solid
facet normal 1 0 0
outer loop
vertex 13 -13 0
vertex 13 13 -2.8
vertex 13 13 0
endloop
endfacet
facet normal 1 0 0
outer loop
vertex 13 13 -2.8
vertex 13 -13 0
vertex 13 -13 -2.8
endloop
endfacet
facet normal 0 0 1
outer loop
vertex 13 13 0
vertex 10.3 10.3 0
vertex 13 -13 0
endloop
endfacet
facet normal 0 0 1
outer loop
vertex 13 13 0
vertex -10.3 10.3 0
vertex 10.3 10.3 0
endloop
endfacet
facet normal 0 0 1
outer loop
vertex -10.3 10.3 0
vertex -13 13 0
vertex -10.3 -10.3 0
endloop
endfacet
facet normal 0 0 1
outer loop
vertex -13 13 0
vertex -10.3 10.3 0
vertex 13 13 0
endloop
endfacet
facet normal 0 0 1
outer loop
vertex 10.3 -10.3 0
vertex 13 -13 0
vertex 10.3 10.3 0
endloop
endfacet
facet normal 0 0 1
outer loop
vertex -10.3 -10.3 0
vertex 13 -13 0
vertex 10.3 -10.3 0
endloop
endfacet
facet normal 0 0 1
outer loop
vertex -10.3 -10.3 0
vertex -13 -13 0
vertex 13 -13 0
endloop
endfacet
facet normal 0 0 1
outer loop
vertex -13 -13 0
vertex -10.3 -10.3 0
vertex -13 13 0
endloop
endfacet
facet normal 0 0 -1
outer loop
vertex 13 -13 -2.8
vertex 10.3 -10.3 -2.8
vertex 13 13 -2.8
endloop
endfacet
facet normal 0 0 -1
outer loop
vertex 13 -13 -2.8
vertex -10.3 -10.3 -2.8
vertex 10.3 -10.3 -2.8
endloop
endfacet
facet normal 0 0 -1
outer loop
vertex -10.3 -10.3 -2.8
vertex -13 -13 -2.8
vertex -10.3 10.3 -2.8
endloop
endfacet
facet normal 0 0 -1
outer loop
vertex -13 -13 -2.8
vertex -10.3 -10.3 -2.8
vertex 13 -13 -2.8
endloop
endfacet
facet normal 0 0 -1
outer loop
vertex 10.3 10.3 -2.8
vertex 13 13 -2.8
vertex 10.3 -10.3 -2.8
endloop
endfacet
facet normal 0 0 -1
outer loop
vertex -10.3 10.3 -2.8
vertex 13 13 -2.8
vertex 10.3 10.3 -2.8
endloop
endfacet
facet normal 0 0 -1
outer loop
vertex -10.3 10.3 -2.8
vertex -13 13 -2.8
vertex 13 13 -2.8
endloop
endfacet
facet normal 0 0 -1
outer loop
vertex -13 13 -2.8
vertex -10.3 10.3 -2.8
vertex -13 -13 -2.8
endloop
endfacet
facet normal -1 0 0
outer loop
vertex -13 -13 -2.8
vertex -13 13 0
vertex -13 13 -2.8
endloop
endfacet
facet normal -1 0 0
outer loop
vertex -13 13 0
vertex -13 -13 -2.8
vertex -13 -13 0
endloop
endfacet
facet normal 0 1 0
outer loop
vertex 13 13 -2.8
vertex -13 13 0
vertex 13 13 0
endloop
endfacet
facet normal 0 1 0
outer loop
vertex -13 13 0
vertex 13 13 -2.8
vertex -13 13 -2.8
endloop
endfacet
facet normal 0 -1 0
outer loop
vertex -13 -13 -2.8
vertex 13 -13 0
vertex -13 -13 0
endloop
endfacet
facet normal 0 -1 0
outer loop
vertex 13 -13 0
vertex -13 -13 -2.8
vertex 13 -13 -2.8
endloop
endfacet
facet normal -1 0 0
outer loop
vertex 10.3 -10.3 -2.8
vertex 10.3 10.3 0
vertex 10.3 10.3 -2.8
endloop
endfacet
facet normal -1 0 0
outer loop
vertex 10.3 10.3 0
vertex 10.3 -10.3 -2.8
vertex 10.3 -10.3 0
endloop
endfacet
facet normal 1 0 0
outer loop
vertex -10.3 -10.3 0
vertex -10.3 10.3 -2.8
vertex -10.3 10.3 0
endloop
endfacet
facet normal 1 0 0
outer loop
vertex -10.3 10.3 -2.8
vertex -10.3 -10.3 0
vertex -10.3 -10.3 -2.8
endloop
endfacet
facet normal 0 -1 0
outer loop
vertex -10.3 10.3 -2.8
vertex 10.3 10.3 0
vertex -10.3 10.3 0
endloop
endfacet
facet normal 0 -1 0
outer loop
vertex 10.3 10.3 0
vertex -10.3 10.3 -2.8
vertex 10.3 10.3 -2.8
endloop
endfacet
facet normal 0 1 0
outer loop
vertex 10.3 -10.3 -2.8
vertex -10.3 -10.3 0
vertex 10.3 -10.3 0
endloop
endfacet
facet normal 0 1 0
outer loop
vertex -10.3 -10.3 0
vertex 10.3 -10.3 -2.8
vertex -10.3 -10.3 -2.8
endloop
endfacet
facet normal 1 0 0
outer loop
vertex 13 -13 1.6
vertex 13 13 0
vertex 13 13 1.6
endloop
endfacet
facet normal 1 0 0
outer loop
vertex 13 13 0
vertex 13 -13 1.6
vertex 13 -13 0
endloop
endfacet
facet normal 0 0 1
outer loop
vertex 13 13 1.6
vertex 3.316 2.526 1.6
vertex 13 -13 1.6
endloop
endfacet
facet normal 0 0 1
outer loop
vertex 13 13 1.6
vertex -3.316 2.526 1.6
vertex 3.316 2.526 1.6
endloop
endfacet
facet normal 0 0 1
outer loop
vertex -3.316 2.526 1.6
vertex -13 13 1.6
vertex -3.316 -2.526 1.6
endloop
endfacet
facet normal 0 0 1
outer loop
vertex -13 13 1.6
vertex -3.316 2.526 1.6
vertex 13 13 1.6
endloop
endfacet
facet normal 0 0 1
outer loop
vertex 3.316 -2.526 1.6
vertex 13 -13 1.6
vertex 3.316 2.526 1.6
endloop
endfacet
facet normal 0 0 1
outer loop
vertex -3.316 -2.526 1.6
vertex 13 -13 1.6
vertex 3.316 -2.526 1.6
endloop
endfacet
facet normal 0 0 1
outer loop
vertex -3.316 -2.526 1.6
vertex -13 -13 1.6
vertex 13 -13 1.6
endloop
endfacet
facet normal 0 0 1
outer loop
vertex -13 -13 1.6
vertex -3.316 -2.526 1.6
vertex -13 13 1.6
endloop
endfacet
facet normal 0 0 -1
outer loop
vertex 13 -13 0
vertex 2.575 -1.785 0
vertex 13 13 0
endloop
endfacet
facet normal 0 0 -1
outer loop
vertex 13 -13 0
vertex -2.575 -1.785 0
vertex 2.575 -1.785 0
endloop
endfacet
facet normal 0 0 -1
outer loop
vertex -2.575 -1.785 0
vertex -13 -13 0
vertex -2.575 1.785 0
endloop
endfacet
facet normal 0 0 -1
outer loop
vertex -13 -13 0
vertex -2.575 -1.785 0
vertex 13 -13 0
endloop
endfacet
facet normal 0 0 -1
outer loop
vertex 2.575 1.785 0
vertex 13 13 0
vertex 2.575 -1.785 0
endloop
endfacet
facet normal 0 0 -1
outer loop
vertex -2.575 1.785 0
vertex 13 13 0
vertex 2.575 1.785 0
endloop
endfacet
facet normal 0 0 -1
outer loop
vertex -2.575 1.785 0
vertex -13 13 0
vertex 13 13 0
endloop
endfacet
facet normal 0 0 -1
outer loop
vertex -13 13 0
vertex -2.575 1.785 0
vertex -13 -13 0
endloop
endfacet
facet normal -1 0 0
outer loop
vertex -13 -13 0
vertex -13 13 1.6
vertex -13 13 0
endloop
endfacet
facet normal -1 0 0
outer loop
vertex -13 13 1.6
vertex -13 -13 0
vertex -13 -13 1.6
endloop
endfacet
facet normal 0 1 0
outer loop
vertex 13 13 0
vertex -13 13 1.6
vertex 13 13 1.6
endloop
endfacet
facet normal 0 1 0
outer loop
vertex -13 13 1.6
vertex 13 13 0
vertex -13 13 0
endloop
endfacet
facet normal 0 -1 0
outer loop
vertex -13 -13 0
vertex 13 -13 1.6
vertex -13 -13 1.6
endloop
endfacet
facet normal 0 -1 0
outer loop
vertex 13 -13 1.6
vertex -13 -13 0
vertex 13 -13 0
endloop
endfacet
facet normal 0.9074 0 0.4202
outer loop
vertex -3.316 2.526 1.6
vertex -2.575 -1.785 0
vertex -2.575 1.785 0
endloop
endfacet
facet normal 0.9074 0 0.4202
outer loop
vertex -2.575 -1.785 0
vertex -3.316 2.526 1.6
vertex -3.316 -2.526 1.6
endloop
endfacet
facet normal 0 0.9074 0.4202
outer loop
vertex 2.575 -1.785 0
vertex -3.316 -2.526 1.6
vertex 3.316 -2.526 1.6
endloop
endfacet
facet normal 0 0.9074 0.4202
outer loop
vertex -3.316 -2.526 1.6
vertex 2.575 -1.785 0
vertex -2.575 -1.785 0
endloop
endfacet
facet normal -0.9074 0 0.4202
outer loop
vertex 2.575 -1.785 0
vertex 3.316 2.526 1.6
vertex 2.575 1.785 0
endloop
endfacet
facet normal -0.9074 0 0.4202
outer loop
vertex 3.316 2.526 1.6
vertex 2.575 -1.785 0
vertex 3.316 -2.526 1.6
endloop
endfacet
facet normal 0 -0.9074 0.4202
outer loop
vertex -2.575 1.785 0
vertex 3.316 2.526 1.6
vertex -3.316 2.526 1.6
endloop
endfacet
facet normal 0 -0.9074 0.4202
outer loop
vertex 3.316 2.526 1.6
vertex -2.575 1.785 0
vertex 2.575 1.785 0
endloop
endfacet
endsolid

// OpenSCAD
// Parametric front window + pocket for a Qwiic APDS-9960 breakout.
//
// UNTESTED DESIGN. Measure your breakout and enclosure wall, then set the
// MEASURE parameters below. Print in an opaque, matte, dark material:
// light-coloured or translucent plastic leaks the sensor's own IR into its
// photodiodes (crosstalk) and ruins gesture detection.
//
// Optical rules this model enforces:
//  * The APDS-9960 package (IR LED + photodiode array, 3.94 x 2.36 mm per
//    the datasheet) sits directly behind an OPEN aperture: no cover, no
//    window, no tape. (An IR-transparent window is possible but needs its
//    own crosstalk testing and is not modelled here.)
//  * The aperture widens outward (chamfer) so the sensor's field of view is
//    not clipped by the wall thickness.
//  * The package face sits as close to the outer surface as the wall allows
//    (`face_gap`); a deep tunnel reflects IR back into the sensor.

// ---- MEASURE (mm) ----
board_w = 20.0;      // breakout PCB width  (MEASURE)
board_h = 20.0;      // breakout PCB height (MEASURE)
board_t = 1.6;       // PCB thickness
sensor_dx = 0.0;     // sensor centre offset from PCB centre, x (MEASURE)
sensor_dy = 0.0;     // sensor centre offset from PCB centre, y (MEASURE)
wall = 1.6;          // enclosure wall thickness at the window
face_gap = 0.2;      // air gap between package top and wall inner face

// ---- Optical aperture ----
pkg_w = 3.94;        // APDS-9960 package (datasheet)
pkg_h = 2.36;
margin = 0.6;        // clearance around the package at the inner face
flare = 50;          // total outward chamfer angle in degrees (field-of-view relief)

// ---- Mount ----
clearance = 0.3;
pocket_depth = board_t + 1.0;
plate_margin = 3.0;

$fn = 48;

module aperture() {
  iw = pkg_w + 2 * margin;
  ih = pkg_h + 2 * margin;
  grow = 2 * wall * tan(flare / 2);
  // Truncated pyramid through the wall, small side inside.
  translate([sensor_dx, sensor_dy, -0.01])
    hull() {
      translate([-iw / 2, -ih / 2, 0]) cube([iw, ih, 0.01]);
      translate([-(iw + grow) / 2, -(ih + grow) / 2, wall + 0.01]) cube([iw + grow, ih + grow, 0.01]);
    }
}

module window_plate() {
  pw = board_w + 2 * plate_margin;
  ph = board_h + 2 * plate_margin;
  difference() {
    union() {
      // Wall section (outer surface at z = wall).
      translate([-pw / 2, -ph / 2, 0]) cube([pw, ph, wall]);
      // Pocket walls behind the wall to locate the PCB.
      translate([-pw / 2, -ph / 2, -pocket_depth - face_gap]) difference() {
        cube([pw, ph, pocket_depth + face_gap]);
        translate([plate_margin - clearance, plate_margin - clearance, -0.01])
          cube([board_w + 2 * clearance, board_h + 2 * clearance, pocket_depth + face_gap + 0.02]);
      }
    }
    aperture();
  }
}

window_plate();
